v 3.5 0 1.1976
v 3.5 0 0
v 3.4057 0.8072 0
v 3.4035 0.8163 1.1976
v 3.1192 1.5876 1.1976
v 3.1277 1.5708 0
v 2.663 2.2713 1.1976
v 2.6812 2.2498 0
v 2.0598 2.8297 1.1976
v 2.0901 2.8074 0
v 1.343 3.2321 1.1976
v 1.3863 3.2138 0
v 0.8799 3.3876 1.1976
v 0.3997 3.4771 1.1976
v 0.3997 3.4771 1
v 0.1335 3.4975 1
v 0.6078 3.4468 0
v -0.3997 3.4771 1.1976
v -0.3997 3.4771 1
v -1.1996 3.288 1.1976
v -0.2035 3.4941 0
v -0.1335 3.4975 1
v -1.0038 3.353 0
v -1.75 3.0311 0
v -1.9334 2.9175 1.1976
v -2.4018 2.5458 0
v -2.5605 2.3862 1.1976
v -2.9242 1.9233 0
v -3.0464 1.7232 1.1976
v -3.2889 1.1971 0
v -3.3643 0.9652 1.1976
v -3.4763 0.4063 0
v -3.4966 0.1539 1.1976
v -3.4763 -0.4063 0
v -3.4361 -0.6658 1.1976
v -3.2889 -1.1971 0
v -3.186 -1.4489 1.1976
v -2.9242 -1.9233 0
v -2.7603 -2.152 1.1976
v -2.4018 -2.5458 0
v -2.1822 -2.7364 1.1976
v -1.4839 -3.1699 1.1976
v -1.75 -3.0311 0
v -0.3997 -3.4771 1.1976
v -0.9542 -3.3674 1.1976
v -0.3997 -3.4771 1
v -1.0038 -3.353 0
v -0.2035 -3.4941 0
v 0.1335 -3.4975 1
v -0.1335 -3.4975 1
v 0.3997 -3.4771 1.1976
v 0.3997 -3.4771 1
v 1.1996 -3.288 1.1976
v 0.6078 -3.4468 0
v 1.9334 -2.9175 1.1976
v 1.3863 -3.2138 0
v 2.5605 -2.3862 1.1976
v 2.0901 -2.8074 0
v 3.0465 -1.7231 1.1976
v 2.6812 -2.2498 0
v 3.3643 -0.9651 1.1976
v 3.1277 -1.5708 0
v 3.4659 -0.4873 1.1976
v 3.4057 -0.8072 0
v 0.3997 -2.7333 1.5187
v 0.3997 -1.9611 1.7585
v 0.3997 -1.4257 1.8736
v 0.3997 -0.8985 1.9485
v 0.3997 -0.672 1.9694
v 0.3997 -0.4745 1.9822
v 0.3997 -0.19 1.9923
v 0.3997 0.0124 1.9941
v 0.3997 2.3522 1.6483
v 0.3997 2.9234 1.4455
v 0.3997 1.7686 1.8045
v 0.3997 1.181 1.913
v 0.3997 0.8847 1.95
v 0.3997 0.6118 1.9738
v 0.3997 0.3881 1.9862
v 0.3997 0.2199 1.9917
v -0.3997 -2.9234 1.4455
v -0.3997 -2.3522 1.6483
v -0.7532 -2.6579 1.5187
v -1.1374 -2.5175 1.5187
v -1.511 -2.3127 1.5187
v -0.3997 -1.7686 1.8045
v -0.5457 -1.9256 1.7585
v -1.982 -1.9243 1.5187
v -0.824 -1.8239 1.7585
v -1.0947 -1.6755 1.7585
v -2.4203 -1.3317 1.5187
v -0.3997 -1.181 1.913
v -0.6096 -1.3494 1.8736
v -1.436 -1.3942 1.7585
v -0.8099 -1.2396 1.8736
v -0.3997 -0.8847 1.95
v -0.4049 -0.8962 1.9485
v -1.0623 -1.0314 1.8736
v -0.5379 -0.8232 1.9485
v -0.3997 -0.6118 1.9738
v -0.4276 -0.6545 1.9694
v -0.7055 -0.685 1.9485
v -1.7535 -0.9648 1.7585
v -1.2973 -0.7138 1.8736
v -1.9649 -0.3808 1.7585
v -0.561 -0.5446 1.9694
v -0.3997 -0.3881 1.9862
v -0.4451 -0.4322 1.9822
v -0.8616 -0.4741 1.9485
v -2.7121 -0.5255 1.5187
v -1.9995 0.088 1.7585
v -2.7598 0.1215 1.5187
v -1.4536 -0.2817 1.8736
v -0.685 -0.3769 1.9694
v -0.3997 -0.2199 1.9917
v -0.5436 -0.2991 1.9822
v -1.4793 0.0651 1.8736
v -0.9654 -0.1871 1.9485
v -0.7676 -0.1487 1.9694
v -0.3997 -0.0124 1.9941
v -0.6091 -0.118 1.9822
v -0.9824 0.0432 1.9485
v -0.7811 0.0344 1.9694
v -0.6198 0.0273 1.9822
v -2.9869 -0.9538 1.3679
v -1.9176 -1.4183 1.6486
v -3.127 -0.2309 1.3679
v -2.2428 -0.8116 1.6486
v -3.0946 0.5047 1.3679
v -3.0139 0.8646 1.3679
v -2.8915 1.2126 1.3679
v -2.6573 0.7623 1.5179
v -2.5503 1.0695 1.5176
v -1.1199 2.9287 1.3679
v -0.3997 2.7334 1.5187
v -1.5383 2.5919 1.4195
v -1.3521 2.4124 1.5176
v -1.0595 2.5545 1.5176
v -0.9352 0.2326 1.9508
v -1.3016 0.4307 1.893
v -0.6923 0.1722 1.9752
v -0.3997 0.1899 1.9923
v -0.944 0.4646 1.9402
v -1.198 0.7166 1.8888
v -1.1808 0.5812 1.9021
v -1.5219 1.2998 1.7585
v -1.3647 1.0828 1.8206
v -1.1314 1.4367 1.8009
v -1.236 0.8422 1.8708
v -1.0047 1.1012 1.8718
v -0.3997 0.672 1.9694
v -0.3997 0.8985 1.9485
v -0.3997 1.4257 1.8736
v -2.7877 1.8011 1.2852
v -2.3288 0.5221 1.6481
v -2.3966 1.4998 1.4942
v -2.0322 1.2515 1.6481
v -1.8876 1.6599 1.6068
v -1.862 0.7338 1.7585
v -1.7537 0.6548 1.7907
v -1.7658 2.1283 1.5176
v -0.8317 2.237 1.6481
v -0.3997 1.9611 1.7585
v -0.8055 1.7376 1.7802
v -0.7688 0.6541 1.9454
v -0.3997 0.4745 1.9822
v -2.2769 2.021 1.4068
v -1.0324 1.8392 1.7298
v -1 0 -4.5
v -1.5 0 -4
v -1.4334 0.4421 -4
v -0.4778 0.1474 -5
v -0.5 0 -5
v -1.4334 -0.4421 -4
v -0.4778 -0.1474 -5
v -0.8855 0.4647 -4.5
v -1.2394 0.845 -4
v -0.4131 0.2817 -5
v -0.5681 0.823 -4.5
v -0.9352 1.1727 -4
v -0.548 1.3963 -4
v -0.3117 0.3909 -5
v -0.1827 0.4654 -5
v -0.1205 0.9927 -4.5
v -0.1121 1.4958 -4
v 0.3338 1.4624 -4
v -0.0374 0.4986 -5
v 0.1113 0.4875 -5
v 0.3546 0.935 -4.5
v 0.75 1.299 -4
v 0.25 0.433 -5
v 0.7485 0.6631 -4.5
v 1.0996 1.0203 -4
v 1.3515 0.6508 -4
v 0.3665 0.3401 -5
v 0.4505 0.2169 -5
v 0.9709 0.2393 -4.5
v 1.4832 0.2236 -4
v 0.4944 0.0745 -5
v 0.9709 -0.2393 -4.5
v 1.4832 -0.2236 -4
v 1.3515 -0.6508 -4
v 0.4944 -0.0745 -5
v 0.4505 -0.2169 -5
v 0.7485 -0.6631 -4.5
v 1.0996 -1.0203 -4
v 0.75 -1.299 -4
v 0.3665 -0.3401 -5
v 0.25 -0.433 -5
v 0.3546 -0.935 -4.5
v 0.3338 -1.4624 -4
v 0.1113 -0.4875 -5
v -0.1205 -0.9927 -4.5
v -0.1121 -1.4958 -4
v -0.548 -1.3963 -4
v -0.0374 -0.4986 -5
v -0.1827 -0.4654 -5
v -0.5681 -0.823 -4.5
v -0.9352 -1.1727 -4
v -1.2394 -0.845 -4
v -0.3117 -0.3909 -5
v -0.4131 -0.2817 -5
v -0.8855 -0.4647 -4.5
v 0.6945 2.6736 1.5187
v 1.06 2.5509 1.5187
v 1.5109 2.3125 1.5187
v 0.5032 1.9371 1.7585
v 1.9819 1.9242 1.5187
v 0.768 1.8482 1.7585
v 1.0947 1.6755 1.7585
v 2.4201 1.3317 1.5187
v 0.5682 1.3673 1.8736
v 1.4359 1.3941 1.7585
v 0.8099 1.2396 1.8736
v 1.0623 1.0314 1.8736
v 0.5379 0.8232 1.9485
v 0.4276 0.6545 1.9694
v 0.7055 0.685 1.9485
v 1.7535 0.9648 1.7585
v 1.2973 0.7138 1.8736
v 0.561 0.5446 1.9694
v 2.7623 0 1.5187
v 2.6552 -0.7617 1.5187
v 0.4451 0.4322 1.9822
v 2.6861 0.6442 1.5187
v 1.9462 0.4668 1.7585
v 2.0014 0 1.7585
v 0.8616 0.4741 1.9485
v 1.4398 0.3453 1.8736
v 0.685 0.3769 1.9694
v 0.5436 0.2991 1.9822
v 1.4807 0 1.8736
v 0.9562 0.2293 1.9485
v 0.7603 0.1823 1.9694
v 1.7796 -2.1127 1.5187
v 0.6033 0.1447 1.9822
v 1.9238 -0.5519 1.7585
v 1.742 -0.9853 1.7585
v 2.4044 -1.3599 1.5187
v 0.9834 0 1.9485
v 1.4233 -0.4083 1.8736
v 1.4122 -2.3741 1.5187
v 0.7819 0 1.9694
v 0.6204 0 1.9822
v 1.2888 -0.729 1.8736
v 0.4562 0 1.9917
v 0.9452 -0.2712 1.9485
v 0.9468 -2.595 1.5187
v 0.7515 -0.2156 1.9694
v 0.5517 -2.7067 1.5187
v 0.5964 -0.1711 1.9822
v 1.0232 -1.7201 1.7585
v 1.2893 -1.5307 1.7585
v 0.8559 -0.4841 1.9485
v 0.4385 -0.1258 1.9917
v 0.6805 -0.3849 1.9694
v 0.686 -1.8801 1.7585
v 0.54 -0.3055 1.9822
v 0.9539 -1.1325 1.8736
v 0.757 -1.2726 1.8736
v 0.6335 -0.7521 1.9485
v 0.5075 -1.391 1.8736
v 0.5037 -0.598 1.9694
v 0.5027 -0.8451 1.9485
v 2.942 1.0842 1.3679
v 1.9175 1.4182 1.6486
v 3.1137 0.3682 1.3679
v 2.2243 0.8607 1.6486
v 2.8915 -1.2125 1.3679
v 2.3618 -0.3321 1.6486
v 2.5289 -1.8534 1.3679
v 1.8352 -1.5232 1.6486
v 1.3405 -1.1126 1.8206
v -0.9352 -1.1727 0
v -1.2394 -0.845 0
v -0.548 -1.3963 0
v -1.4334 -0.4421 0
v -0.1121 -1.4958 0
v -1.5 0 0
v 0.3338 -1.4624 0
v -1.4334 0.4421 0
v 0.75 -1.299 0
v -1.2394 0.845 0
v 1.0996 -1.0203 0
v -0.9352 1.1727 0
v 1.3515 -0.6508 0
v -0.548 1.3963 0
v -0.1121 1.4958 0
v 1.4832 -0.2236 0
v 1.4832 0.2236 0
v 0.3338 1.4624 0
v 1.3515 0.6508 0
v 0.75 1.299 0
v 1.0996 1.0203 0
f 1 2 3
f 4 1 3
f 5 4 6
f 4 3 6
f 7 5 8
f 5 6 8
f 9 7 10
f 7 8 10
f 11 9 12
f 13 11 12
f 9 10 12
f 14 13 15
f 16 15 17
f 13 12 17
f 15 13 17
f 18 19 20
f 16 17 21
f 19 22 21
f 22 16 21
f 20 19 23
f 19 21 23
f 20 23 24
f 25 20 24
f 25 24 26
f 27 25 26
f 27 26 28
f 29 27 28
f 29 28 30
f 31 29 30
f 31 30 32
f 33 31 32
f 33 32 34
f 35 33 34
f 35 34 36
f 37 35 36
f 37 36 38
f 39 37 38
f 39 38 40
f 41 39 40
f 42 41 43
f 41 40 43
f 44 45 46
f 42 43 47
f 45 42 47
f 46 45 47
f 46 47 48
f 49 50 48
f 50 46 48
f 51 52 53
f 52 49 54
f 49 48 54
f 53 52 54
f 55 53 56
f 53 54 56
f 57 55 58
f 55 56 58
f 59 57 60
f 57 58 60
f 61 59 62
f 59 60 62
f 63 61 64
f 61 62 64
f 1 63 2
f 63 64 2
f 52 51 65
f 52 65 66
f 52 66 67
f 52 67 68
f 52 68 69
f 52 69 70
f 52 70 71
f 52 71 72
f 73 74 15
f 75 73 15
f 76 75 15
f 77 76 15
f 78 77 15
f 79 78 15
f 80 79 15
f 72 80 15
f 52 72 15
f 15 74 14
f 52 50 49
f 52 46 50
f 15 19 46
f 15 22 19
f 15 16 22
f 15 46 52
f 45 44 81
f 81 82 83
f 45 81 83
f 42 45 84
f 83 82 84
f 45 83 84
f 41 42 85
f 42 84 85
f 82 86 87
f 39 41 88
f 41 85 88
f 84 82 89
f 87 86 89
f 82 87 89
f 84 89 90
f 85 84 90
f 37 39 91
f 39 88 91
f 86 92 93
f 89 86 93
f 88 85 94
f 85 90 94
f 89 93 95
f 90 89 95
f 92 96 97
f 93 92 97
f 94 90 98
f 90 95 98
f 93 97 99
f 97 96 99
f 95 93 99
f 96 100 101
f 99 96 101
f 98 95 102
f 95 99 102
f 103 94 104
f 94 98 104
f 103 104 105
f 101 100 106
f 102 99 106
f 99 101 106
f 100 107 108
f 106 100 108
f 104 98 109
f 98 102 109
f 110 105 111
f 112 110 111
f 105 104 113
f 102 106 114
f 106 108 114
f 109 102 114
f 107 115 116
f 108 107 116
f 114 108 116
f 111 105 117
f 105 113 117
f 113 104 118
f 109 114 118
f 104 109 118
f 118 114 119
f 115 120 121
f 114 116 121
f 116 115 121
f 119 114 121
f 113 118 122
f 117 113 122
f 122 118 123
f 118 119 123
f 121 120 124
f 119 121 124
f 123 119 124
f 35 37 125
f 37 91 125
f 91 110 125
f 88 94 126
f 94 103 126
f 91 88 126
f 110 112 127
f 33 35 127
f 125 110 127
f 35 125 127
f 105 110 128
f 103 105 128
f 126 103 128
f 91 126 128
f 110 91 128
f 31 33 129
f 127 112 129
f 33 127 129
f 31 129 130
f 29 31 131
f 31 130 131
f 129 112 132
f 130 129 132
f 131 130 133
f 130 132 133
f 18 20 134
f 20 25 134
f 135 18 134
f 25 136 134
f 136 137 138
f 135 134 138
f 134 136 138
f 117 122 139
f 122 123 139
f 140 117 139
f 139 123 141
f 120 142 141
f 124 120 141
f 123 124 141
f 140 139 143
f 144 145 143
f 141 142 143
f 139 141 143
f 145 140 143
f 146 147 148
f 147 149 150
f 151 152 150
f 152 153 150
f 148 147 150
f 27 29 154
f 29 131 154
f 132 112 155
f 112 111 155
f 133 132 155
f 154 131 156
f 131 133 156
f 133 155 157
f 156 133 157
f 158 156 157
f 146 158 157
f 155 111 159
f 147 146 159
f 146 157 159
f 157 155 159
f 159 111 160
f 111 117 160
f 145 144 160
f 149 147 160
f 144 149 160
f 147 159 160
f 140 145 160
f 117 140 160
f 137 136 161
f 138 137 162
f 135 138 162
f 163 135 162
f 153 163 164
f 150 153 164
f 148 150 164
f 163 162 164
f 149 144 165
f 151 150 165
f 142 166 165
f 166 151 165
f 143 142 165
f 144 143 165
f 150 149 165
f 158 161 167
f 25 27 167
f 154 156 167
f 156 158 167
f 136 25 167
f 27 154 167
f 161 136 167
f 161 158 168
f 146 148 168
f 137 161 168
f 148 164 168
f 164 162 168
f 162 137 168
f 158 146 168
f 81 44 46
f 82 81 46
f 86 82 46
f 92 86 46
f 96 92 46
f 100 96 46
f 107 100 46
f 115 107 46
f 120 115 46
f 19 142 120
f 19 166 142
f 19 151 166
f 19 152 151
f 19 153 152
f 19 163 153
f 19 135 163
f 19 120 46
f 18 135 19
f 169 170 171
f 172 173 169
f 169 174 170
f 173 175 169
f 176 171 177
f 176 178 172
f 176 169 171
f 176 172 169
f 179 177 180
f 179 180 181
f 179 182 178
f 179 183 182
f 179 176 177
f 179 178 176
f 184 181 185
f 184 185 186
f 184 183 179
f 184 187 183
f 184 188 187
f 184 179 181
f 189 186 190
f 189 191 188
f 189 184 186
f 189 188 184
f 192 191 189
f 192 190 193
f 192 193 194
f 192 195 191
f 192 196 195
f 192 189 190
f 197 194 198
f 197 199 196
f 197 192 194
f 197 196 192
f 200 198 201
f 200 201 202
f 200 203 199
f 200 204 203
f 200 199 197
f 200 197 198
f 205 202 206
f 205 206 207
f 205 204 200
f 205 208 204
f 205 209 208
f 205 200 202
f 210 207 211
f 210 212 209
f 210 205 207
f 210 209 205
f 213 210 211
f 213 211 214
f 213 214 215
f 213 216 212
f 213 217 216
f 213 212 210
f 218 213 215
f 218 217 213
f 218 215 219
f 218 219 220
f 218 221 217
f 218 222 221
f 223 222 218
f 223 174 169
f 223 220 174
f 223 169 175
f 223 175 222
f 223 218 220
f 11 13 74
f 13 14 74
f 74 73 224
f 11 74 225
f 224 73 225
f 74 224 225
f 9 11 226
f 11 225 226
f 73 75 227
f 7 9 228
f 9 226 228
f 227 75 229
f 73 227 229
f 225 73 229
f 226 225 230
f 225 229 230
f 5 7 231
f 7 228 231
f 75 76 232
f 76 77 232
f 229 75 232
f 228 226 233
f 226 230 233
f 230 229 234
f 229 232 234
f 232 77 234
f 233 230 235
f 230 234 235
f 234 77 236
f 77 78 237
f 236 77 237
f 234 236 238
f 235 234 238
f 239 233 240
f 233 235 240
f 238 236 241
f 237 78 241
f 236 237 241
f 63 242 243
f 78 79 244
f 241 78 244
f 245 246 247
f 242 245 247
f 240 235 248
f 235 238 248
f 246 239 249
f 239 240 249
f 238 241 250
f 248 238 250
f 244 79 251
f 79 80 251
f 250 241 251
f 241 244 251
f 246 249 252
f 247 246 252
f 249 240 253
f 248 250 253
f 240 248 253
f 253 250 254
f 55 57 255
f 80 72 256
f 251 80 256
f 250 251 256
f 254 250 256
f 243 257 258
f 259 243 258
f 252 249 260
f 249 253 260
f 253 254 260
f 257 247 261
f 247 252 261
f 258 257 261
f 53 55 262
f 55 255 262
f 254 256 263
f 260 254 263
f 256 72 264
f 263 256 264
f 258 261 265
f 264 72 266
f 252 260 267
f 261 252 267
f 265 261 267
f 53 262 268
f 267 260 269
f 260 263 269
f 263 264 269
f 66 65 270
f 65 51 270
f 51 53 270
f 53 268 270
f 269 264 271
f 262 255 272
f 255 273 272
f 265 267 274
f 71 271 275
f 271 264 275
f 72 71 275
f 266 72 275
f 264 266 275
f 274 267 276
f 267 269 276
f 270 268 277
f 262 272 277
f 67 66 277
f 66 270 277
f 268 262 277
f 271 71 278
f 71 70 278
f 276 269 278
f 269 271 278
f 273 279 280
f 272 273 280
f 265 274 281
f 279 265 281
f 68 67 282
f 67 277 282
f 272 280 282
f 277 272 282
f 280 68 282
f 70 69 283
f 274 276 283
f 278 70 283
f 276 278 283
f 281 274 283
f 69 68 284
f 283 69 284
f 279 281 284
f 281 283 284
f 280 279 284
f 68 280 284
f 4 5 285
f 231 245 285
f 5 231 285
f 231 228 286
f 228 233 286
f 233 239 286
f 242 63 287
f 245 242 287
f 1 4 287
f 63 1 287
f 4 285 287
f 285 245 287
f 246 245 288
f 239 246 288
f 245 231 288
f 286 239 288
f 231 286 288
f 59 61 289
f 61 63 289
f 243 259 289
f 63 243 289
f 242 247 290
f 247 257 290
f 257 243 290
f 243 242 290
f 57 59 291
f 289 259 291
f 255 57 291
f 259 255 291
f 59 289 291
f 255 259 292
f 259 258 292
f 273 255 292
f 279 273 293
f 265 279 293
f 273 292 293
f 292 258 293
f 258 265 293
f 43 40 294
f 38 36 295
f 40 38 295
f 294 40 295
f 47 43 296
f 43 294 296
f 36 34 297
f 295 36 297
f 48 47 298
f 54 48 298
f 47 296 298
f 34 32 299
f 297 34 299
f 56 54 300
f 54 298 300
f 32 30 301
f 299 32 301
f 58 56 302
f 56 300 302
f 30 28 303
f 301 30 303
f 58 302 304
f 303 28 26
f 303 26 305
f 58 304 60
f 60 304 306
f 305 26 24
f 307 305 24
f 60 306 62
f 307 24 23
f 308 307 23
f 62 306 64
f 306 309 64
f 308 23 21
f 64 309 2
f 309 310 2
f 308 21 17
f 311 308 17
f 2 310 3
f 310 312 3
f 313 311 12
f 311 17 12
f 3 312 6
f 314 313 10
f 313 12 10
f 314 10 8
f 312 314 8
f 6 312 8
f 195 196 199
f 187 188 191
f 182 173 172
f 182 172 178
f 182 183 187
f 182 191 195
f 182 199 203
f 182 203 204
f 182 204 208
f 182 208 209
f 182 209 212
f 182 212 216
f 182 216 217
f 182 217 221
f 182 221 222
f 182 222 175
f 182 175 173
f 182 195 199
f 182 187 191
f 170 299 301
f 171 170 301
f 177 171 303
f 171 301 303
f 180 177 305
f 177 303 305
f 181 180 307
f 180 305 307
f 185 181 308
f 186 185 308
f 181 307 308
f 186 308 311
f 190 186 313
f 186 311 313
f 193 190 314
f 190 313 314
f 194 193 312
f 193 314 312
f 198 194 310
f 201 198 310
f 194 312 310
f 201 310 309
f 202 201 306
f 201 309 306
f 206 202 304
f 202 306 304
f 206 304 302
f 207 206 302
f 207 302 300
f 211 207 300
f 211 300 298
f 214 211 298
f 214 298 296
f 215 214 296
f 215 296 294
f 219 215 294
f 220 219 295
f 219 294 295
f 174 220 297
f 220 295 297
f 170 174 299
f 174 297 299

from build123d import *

# Parameters (mm, degrees)
SKETCH_1_R          = 3.5
EXTRUDE_1_DEPTH     = 2
SKETCH_2_W          = 0.799406376
SKETCH_2_H          = 7.454929226
CUT_EXTRUDE_1_DEPTH = 1
SKETCH_3_R          = 1.5
EXTRUDE_2_DEPTH     = 5
CHAMFER_1_SIZE      = 1


with BuildPart() as part:
    # Эскиз1 → Бобышка-Вытянуть1 (new body)
    with BuildSketch(Plane.XY):
        Circle(SKETCH_1_R)
    extrude(amount=EXTRUDE_1_DEPTH)

    # Эскиз2 → Вырез-Вытянуть1 (cut)
    with BuildSketch(Plane.XY.offset(2)):
        Rectangle(SKETCH_2_W, SKETCH_2_H)
    extrude(amount=-CUT_EXTRUDE_1_DEPTH, mode=Mode.SUBTRACT)

    # Эскиз3 → Бобышка-Вытянуть2 (add)
    with BuildSketch(Plane(origin=(0, 0, 0), x_dir=(-1, 0, 0), z_dir=(0, 0, -1))):
        Circle(SKETCH_3_R)
    extrude(amount=EXTRUDE_2_DEPTH)

    # Фаска1
    chamfer_1_edges = [part.edges().sort_by_distance(p)[0] for p in [
        (1.5, 0, -5),
    ]]
    chamfer(chamfer_1_edges, length=CHAMFER_1_SIZE)

    # Эскиз6 → Вырез-Повернуть3 (revolve, cut)
    with BuildSketch(Plane(origin=(0, 0, 0), x_dir=(1, 0, 0), z_dir=(0, 1, 0))):
        with BuildLine():
            Line((0.1, -2), (3.503572085, -2))
            Line((3.503572085, -2), (3.503572085, -1.195824387))
            ThreePointArc((3.503572085, -1.195824387), (1.848642427, -1.796225946), (0.1, -2))
        make_face()
    revolve(axis=Axis((0, 0, 4.44135275), (0, 0, -1)), mode=Mode.SUBTRACT)


solid = part.part
